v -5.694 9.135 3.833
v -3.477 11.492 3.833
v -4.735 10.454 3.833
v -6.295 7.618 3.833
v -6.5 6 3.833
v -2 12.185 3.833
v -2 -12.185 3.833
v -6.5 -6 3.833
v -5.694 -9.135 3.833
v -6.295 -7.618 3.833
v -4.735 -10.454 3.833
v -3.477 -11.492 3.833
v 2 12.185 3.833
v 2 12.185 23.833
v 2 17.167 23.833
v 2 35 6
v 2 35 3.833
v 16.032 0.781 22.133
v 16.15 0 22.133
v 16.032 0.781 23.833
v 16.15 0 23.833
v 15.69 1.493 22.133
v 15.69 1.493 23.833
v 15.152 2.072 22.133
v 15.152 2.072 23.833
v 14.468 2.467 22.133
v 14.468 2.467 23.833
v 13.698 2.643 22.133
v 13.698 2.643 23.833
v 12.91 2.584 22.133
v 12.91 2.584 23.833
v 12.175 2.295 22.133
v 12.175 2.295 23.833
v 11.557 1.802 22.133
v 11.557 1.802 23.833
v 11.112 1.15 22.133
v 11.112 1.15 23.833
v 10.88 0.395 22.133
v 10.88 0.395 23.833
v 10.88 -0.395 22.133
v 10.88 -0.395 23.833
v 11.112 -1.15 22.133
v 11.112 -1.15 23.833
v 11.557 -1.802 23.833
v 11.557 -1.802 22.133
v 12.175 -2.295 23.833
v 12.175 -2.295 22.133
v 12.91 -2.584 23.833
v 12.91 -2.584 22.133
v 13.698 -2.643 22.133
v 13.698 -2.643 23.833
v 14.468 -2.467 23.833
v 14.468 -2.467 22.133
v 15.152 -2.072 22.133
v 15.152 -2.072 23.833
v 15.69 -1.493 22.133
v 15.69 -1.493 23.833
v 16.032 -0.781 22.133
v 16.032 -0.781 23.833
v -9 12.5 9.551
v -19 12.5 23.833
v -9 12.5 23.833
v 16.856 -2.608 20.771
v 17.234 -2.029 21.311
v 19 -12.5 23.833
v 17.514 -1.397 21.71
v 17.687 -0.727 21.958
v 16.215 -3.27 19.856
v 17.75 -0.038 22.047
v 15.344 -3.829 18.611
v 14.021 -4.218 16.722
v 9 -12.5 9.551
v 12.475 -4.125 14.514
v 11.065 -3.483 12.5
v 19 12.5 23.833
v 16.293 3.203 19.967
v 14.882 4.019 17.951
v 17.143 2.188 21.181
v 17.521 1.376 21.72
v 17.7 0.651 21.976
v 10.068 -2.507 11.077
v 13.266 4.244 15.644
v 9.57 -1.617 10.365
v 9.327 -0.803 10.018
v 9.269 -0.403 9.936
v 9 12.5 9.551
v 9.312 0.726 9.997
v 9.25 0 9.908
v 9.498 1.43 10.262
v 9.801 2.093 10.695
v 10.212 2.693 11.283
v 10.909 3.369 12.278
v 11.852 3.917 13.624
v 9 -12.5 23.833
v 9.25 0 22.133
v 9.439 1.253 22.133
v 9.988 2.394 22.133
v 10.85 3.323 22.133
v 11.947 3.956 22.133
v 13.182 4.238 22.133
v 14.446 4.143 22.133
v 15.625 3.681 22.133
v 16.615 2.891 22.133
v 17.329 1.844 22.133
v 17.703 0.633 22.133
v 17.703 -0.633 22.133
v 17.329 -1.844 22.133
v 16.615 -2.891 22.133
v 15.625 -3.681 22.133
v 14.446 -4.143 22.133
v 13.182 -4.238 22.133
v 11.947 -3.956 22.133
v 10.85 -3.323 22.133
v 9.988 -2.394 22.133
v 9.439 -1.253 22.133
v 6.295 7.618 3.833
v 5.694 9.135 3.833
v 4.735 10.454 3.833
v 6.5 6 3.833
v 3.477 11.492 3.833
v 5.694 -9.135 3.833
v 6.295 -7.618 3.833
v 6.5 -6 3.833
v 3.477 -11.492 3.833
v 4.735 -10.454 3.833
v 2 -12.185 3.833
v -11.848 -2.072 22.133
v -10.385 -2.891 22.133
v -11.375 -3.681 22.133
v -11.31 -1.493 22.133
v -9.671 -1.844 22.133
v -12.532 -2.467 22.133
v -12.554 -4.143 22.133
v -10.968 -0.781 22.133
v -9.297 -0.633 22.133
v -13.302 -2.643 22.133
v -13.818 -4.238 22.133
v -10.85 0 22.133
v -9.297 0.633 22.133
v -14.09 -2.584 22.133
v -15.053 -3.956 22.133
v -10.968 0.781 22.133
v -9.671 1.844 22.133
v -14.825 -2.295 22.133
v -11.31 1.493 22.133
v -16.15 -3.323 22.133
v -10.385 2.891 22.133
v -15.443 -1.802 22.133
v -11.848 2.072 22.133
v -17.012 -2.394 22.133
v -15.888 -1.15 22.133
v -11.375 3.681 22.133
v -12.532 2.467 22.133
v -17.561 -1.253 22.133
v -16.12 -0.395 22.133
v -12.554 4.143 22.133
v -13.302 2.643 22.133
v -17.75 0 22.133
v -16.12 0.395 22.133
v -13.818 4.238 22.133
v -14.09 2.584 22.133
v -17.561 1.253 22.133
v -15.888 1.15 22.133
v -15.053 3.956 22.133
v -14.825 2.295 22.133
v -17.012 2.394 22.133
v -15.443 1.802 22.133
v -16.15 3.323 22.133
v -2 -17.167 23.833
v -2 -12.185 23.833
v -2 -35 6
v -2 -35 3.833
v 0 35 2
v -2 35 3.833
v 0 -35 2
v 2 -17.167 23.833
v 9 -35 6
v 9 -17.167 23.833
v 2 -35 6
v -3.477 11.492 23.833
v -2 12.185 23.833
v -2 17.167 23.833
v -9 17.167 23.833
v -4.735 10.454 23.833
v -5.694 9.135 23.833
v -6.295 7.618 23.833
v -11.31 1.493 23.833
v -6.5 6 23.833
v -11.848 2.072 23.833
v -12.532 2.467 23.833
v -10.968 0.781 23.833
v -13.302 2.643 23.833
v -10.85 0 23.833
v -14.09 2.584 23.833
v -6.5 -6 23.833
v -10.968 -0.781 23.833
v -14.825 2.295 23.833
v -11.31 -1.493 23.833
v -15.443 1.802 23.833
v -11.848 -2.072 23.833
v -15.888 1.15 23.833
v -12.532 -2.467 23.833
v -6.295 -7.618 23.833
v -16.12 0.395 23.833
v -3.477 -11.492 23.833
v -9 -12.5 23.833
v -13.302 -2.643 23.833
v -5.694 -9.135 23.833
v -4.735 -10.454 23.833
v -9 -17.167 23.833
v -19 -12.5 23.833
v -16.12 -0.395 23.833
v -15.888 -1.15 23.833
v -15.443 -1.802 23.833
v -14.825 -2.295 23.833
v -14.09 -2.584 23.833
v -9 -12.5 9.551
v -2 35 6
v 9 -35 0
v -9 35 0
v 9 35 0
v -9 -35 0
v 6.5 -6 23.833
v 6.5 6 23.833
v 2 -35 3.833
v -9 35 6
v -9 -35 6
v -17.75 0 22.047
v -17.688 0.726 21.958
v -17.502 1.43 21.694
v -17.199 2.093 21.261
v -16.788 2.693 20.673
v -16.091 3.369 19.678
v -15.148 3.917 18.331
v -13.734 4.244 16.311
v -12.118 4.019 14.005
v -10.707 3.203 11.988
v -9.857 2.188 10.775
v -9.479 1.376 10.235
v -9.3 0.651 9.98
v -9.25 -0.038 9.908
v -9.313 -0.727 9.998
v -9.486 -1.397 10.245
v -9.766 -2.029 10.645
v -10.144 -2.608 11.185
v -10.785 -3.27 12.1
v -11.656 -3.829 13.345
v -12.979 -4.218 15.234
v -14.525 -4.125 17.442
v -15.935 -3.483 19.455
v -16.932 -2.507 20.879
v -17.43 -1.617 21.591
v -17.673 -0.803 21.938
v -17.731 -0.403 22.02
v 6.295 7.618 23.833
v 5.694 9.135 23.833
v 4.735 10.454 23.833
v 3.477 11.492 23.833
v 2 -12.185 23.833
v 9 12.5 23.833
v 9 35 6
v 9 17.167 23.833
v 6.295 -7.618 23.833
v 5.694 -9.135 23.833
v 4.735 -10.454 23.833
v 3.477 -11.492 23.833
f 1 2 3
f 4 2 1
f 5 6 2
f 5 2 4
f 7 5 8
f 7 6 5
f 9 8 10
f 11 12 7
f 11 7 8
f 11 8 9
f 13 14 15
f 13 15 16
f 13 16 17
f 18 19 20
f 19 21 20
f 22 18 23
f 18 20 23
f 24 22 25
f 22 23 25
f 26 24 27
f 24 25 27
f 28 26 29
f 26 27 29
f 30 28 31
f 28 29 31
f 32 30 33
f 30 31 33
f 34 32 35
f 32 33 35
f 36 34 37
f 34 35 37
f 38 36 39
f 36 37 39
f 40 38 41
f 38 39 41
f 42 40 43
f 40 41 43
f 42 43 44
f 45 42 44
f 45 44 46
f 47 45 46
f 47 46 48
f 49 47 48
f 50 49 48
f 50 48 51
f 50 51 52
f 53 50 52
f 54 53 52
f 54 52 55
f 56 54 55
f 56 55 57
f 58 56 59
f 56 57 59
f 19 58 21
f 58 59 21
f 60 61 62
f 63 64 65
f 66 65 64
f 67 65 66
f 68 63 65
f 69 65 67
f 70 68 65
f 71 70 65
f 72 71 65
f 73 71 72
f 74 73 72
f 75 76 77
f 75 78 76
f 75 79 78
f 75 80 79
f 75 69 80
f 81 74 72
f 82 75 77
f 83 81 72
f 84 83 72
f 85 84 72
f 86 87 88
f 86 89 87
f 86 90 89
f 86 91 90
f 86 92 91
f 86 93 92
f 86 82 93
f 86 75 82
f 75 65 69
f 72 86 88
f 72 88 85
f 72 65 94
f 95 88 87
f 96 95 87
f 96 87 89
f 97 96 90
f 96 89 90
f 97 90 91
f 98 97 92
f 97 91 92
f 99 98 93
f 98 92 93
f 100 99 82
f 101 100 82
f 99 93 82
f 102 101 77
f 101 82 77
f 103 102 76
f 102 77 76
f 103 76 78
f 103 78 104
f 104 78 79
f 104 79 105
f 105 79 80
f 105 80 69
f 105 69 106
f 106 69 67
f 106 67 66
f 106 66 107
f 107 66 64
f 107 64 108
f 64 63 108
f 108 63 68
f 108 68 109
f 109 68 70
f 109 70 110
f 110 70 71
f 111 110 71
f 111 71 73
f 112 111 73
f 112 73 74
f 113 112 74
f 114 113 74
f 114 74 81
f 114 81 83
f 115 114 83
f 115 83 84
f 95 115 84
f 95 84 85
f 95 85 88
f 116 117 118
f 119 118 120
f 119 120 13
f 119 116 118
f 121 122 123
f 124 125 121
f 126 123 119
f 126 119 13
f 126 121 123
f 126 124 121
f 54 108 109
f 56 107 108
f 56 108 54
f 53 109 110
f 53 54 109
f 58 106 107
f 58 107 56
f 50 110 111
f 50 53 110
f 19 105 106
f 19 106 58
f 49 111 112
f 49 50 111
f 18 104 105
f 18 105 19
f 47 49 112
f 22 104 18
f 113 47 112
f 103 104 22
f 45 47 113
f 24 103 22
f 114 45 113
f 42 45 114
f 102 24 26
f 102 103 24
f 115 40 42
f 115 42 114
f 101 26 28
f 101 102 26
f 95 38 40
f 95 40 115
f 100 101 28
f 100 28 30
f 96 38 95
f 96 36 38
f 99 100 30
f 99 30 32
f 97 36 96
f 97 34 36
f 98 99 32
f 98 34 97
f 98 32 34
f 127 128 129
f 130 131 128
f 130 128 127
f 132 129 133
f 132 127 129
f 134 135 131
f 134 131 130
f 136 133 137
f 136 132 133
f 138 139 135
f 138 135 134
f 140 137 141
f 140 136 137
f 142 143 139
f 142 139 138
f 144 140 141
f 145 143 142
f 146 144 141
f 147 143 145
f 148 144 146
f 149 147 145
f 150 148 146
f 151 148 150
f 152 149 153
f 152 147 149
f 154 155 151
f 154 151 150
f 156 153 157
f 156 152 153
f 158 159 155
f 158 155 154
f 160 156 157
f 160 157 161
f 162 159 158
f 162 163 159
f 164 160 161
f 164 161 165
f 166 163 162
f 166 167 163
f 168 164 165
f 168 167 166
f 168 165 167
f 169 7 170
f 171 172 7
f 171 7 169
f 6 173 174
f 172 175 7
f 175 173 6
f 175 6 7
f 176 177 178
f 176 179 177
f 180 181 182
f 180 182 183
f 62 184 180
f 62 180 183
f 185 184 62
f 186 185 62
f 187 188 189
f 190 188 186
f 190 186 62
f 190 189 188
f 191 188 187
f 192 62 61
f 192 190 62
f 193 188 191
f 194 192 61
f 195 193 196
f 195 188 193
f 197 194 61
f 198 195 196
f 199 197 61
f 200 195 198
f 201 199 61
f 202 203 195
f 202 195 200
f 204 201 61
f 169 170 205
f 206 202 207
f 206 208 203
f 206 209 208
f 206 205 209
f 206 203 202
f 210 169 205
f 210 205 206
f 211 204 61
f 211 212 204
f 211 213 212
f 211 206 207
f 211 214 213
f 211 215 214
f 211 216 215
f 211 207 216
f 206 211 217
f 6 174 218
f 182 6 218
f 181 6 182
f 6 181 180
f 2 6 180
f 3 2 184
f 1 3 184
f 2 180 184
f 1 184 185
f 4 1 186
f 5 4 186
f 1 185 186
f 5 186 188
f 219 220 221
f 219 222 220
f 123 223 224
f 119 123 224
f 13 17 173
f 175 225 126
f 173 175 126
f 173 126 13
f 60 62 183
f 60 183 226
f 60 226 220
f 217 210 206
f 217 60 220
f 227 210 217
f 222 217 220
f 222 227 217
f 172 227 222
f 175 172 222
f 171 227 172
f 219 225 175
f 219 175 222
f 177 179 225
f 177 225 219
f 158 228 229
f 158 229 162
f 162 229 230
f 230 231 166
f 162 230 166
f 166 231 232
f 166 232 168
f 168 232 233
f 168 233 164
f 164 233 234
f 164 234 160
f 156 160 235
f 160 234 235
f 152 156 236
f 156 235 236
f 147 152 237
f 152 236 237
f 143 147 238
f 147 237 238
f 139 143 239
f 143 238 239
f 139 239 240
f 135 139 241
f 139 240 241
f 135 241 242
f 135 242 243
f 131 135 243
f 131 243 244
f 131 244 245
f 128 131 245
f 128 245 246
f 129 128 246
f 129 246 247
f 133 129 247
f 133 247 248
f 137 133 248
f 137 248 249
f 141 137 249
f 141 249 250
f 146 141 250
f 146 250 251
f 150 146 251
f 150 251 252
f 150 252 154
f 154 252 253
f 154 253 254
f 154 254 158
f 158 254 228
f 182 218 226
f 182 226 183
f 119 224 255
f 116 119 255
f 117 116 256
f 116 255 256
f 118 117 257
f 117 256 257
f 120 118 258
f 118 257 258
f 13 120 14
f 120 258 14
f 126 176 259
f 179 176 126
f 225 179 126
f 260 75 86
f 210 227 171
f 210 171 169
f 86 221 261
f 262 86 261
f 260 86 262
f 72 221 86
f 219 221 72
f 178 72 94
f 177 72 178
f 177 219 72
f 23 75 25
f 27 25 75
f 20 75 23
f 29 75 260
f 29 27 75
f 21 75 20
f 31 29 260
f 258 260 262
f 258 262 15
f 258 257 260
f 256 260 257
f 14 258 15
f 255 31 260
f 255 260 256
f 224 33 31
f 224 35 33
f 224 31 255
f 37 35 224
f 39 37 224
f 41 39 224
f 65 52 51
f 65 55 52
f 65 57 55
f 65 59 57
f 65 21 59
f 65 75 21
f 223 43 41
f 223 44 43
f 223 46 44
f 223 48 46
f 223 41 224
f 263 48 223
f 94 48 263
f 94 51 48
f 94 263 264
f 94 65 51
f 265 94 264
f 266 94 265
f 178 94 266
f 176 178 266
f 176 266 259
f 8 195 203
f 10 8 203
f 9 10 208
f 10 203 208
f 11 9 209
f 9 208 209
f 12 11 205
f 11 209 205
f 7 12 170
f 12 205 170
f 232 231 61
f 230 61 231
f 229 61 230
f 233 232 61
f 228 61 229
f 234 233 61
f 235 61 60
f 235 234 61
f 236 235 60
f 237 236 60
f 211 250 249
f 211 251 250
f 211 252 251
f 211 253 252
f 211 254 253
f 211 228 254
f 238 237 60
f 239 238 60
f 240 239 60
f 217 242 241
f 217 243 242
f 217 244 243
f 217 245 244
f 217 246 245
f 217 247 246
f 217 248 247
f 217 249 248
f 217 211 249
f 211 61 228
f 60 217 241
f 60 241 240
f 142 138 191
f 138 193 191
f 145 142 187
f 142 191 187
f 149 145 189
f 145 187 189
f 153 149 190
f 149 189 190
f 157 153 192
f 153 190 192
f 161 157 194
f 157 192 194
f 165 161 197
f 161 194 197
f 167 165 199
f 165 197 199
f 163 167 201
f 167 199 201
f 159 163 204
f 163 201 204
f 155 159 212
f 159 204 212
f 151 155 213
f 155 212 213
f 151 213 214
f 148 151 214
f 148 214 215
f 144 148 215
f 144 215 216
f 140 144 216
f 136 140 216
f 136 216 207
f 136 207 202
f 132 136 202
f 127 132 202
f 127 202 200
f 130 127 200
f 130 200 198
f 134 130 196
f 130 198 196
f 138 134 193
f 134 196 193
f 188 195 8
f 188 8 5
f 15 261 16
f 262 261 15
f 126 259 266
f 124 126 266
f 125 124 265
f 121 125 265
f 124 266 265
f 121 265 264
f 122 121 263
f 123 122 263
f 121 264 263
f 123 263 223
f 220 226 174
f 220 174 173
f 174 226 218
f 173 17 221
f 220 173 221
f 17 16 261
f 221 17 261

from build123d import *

# Parameters (mm, degrees)
PAD_DEPTH        = 35
POCKET_DEPTH     = 20
PAD001_DEPTH     = 12.5
HOLE_D           = 5.3
HOLE_DEPTH       = 25
HOLE_CBORE_D     = 8.5
HOLE_CBORE_DEPTH = 12.3
POCKET001_DEPTH  = 11


with BuildPart() as part:
    # Sketch → Pad (new body, symmetric)
    with BuildSketch(Plane.XZ):
        Polygon((-9, 0), (9, 0), (9, 23.832662), (2, 23.832662), (2, 3.832662), (0, 2), (-2, 3.832662), (-2, 23.832662), (-9, 23.832662), align=None)
    extrude(amount=PAD_DEPTH, both=True)

    # Sketch001 (on Face3 of Pad) → Pocket (cut)
    with BuildSketch(Plane(origin=(0, 0, 23.832662), x_dir=(-1, 0, 0), z_dir=(0, 0, 1))):
        with BuildLine():
            ThreePointArc((6.5, 6), (0, 12.5), (-6.5, 6))
            Line((-6.5, 6), (-6.5, -6))
            ThreePointArc((-6.5, -6), (0, -12.5), (6.5, -6))
            Line((6.5, 6), (6.5, -6))
        make_face()
    extrude(amount=-POCKET_DEPTH, mode=Mode.SUBTRACT)

    # Sketch002 → Pad001 (join, symmetric)
    with BuildSketch(Plane.XZ):
        Polygon((9, 23.832662), (19, 23.832662), (9, 9.551182), align=None)
        Polygon((-9, 23.832662), (-19, 23.832662), (-9, 9.551182), align=None)
    extrude(amount=PAD001_DEPTH, both=True)

    # Hole
    with Locations(Plane(origin=(0, 0, 9.832662), x_dir=(-1, 0, 0), z_dir=(0, 0, -1))):
        with Locations((-13.5, 0), (13.5, 0)):
            CounterBoreHole(HOLE_D / 2, HOLE_CBORE_D / 2, HOLE_CBORE_DEPTH, depth=HOLE_DEPTH)

    # Sketch005 → Pocket001 (cut, symmetric)
    with BuildSketch(Plane.YZ):
        Polygon((-36, 25), (-36, 5), (-16, 25), align=None)
        Polygon((16, 25), (36, 25), (36, 5), align=None)
    extrude(amount=POCKET001_DEPTH, both=True, mode=Mode.SUBTRACT)


solid = part.part
